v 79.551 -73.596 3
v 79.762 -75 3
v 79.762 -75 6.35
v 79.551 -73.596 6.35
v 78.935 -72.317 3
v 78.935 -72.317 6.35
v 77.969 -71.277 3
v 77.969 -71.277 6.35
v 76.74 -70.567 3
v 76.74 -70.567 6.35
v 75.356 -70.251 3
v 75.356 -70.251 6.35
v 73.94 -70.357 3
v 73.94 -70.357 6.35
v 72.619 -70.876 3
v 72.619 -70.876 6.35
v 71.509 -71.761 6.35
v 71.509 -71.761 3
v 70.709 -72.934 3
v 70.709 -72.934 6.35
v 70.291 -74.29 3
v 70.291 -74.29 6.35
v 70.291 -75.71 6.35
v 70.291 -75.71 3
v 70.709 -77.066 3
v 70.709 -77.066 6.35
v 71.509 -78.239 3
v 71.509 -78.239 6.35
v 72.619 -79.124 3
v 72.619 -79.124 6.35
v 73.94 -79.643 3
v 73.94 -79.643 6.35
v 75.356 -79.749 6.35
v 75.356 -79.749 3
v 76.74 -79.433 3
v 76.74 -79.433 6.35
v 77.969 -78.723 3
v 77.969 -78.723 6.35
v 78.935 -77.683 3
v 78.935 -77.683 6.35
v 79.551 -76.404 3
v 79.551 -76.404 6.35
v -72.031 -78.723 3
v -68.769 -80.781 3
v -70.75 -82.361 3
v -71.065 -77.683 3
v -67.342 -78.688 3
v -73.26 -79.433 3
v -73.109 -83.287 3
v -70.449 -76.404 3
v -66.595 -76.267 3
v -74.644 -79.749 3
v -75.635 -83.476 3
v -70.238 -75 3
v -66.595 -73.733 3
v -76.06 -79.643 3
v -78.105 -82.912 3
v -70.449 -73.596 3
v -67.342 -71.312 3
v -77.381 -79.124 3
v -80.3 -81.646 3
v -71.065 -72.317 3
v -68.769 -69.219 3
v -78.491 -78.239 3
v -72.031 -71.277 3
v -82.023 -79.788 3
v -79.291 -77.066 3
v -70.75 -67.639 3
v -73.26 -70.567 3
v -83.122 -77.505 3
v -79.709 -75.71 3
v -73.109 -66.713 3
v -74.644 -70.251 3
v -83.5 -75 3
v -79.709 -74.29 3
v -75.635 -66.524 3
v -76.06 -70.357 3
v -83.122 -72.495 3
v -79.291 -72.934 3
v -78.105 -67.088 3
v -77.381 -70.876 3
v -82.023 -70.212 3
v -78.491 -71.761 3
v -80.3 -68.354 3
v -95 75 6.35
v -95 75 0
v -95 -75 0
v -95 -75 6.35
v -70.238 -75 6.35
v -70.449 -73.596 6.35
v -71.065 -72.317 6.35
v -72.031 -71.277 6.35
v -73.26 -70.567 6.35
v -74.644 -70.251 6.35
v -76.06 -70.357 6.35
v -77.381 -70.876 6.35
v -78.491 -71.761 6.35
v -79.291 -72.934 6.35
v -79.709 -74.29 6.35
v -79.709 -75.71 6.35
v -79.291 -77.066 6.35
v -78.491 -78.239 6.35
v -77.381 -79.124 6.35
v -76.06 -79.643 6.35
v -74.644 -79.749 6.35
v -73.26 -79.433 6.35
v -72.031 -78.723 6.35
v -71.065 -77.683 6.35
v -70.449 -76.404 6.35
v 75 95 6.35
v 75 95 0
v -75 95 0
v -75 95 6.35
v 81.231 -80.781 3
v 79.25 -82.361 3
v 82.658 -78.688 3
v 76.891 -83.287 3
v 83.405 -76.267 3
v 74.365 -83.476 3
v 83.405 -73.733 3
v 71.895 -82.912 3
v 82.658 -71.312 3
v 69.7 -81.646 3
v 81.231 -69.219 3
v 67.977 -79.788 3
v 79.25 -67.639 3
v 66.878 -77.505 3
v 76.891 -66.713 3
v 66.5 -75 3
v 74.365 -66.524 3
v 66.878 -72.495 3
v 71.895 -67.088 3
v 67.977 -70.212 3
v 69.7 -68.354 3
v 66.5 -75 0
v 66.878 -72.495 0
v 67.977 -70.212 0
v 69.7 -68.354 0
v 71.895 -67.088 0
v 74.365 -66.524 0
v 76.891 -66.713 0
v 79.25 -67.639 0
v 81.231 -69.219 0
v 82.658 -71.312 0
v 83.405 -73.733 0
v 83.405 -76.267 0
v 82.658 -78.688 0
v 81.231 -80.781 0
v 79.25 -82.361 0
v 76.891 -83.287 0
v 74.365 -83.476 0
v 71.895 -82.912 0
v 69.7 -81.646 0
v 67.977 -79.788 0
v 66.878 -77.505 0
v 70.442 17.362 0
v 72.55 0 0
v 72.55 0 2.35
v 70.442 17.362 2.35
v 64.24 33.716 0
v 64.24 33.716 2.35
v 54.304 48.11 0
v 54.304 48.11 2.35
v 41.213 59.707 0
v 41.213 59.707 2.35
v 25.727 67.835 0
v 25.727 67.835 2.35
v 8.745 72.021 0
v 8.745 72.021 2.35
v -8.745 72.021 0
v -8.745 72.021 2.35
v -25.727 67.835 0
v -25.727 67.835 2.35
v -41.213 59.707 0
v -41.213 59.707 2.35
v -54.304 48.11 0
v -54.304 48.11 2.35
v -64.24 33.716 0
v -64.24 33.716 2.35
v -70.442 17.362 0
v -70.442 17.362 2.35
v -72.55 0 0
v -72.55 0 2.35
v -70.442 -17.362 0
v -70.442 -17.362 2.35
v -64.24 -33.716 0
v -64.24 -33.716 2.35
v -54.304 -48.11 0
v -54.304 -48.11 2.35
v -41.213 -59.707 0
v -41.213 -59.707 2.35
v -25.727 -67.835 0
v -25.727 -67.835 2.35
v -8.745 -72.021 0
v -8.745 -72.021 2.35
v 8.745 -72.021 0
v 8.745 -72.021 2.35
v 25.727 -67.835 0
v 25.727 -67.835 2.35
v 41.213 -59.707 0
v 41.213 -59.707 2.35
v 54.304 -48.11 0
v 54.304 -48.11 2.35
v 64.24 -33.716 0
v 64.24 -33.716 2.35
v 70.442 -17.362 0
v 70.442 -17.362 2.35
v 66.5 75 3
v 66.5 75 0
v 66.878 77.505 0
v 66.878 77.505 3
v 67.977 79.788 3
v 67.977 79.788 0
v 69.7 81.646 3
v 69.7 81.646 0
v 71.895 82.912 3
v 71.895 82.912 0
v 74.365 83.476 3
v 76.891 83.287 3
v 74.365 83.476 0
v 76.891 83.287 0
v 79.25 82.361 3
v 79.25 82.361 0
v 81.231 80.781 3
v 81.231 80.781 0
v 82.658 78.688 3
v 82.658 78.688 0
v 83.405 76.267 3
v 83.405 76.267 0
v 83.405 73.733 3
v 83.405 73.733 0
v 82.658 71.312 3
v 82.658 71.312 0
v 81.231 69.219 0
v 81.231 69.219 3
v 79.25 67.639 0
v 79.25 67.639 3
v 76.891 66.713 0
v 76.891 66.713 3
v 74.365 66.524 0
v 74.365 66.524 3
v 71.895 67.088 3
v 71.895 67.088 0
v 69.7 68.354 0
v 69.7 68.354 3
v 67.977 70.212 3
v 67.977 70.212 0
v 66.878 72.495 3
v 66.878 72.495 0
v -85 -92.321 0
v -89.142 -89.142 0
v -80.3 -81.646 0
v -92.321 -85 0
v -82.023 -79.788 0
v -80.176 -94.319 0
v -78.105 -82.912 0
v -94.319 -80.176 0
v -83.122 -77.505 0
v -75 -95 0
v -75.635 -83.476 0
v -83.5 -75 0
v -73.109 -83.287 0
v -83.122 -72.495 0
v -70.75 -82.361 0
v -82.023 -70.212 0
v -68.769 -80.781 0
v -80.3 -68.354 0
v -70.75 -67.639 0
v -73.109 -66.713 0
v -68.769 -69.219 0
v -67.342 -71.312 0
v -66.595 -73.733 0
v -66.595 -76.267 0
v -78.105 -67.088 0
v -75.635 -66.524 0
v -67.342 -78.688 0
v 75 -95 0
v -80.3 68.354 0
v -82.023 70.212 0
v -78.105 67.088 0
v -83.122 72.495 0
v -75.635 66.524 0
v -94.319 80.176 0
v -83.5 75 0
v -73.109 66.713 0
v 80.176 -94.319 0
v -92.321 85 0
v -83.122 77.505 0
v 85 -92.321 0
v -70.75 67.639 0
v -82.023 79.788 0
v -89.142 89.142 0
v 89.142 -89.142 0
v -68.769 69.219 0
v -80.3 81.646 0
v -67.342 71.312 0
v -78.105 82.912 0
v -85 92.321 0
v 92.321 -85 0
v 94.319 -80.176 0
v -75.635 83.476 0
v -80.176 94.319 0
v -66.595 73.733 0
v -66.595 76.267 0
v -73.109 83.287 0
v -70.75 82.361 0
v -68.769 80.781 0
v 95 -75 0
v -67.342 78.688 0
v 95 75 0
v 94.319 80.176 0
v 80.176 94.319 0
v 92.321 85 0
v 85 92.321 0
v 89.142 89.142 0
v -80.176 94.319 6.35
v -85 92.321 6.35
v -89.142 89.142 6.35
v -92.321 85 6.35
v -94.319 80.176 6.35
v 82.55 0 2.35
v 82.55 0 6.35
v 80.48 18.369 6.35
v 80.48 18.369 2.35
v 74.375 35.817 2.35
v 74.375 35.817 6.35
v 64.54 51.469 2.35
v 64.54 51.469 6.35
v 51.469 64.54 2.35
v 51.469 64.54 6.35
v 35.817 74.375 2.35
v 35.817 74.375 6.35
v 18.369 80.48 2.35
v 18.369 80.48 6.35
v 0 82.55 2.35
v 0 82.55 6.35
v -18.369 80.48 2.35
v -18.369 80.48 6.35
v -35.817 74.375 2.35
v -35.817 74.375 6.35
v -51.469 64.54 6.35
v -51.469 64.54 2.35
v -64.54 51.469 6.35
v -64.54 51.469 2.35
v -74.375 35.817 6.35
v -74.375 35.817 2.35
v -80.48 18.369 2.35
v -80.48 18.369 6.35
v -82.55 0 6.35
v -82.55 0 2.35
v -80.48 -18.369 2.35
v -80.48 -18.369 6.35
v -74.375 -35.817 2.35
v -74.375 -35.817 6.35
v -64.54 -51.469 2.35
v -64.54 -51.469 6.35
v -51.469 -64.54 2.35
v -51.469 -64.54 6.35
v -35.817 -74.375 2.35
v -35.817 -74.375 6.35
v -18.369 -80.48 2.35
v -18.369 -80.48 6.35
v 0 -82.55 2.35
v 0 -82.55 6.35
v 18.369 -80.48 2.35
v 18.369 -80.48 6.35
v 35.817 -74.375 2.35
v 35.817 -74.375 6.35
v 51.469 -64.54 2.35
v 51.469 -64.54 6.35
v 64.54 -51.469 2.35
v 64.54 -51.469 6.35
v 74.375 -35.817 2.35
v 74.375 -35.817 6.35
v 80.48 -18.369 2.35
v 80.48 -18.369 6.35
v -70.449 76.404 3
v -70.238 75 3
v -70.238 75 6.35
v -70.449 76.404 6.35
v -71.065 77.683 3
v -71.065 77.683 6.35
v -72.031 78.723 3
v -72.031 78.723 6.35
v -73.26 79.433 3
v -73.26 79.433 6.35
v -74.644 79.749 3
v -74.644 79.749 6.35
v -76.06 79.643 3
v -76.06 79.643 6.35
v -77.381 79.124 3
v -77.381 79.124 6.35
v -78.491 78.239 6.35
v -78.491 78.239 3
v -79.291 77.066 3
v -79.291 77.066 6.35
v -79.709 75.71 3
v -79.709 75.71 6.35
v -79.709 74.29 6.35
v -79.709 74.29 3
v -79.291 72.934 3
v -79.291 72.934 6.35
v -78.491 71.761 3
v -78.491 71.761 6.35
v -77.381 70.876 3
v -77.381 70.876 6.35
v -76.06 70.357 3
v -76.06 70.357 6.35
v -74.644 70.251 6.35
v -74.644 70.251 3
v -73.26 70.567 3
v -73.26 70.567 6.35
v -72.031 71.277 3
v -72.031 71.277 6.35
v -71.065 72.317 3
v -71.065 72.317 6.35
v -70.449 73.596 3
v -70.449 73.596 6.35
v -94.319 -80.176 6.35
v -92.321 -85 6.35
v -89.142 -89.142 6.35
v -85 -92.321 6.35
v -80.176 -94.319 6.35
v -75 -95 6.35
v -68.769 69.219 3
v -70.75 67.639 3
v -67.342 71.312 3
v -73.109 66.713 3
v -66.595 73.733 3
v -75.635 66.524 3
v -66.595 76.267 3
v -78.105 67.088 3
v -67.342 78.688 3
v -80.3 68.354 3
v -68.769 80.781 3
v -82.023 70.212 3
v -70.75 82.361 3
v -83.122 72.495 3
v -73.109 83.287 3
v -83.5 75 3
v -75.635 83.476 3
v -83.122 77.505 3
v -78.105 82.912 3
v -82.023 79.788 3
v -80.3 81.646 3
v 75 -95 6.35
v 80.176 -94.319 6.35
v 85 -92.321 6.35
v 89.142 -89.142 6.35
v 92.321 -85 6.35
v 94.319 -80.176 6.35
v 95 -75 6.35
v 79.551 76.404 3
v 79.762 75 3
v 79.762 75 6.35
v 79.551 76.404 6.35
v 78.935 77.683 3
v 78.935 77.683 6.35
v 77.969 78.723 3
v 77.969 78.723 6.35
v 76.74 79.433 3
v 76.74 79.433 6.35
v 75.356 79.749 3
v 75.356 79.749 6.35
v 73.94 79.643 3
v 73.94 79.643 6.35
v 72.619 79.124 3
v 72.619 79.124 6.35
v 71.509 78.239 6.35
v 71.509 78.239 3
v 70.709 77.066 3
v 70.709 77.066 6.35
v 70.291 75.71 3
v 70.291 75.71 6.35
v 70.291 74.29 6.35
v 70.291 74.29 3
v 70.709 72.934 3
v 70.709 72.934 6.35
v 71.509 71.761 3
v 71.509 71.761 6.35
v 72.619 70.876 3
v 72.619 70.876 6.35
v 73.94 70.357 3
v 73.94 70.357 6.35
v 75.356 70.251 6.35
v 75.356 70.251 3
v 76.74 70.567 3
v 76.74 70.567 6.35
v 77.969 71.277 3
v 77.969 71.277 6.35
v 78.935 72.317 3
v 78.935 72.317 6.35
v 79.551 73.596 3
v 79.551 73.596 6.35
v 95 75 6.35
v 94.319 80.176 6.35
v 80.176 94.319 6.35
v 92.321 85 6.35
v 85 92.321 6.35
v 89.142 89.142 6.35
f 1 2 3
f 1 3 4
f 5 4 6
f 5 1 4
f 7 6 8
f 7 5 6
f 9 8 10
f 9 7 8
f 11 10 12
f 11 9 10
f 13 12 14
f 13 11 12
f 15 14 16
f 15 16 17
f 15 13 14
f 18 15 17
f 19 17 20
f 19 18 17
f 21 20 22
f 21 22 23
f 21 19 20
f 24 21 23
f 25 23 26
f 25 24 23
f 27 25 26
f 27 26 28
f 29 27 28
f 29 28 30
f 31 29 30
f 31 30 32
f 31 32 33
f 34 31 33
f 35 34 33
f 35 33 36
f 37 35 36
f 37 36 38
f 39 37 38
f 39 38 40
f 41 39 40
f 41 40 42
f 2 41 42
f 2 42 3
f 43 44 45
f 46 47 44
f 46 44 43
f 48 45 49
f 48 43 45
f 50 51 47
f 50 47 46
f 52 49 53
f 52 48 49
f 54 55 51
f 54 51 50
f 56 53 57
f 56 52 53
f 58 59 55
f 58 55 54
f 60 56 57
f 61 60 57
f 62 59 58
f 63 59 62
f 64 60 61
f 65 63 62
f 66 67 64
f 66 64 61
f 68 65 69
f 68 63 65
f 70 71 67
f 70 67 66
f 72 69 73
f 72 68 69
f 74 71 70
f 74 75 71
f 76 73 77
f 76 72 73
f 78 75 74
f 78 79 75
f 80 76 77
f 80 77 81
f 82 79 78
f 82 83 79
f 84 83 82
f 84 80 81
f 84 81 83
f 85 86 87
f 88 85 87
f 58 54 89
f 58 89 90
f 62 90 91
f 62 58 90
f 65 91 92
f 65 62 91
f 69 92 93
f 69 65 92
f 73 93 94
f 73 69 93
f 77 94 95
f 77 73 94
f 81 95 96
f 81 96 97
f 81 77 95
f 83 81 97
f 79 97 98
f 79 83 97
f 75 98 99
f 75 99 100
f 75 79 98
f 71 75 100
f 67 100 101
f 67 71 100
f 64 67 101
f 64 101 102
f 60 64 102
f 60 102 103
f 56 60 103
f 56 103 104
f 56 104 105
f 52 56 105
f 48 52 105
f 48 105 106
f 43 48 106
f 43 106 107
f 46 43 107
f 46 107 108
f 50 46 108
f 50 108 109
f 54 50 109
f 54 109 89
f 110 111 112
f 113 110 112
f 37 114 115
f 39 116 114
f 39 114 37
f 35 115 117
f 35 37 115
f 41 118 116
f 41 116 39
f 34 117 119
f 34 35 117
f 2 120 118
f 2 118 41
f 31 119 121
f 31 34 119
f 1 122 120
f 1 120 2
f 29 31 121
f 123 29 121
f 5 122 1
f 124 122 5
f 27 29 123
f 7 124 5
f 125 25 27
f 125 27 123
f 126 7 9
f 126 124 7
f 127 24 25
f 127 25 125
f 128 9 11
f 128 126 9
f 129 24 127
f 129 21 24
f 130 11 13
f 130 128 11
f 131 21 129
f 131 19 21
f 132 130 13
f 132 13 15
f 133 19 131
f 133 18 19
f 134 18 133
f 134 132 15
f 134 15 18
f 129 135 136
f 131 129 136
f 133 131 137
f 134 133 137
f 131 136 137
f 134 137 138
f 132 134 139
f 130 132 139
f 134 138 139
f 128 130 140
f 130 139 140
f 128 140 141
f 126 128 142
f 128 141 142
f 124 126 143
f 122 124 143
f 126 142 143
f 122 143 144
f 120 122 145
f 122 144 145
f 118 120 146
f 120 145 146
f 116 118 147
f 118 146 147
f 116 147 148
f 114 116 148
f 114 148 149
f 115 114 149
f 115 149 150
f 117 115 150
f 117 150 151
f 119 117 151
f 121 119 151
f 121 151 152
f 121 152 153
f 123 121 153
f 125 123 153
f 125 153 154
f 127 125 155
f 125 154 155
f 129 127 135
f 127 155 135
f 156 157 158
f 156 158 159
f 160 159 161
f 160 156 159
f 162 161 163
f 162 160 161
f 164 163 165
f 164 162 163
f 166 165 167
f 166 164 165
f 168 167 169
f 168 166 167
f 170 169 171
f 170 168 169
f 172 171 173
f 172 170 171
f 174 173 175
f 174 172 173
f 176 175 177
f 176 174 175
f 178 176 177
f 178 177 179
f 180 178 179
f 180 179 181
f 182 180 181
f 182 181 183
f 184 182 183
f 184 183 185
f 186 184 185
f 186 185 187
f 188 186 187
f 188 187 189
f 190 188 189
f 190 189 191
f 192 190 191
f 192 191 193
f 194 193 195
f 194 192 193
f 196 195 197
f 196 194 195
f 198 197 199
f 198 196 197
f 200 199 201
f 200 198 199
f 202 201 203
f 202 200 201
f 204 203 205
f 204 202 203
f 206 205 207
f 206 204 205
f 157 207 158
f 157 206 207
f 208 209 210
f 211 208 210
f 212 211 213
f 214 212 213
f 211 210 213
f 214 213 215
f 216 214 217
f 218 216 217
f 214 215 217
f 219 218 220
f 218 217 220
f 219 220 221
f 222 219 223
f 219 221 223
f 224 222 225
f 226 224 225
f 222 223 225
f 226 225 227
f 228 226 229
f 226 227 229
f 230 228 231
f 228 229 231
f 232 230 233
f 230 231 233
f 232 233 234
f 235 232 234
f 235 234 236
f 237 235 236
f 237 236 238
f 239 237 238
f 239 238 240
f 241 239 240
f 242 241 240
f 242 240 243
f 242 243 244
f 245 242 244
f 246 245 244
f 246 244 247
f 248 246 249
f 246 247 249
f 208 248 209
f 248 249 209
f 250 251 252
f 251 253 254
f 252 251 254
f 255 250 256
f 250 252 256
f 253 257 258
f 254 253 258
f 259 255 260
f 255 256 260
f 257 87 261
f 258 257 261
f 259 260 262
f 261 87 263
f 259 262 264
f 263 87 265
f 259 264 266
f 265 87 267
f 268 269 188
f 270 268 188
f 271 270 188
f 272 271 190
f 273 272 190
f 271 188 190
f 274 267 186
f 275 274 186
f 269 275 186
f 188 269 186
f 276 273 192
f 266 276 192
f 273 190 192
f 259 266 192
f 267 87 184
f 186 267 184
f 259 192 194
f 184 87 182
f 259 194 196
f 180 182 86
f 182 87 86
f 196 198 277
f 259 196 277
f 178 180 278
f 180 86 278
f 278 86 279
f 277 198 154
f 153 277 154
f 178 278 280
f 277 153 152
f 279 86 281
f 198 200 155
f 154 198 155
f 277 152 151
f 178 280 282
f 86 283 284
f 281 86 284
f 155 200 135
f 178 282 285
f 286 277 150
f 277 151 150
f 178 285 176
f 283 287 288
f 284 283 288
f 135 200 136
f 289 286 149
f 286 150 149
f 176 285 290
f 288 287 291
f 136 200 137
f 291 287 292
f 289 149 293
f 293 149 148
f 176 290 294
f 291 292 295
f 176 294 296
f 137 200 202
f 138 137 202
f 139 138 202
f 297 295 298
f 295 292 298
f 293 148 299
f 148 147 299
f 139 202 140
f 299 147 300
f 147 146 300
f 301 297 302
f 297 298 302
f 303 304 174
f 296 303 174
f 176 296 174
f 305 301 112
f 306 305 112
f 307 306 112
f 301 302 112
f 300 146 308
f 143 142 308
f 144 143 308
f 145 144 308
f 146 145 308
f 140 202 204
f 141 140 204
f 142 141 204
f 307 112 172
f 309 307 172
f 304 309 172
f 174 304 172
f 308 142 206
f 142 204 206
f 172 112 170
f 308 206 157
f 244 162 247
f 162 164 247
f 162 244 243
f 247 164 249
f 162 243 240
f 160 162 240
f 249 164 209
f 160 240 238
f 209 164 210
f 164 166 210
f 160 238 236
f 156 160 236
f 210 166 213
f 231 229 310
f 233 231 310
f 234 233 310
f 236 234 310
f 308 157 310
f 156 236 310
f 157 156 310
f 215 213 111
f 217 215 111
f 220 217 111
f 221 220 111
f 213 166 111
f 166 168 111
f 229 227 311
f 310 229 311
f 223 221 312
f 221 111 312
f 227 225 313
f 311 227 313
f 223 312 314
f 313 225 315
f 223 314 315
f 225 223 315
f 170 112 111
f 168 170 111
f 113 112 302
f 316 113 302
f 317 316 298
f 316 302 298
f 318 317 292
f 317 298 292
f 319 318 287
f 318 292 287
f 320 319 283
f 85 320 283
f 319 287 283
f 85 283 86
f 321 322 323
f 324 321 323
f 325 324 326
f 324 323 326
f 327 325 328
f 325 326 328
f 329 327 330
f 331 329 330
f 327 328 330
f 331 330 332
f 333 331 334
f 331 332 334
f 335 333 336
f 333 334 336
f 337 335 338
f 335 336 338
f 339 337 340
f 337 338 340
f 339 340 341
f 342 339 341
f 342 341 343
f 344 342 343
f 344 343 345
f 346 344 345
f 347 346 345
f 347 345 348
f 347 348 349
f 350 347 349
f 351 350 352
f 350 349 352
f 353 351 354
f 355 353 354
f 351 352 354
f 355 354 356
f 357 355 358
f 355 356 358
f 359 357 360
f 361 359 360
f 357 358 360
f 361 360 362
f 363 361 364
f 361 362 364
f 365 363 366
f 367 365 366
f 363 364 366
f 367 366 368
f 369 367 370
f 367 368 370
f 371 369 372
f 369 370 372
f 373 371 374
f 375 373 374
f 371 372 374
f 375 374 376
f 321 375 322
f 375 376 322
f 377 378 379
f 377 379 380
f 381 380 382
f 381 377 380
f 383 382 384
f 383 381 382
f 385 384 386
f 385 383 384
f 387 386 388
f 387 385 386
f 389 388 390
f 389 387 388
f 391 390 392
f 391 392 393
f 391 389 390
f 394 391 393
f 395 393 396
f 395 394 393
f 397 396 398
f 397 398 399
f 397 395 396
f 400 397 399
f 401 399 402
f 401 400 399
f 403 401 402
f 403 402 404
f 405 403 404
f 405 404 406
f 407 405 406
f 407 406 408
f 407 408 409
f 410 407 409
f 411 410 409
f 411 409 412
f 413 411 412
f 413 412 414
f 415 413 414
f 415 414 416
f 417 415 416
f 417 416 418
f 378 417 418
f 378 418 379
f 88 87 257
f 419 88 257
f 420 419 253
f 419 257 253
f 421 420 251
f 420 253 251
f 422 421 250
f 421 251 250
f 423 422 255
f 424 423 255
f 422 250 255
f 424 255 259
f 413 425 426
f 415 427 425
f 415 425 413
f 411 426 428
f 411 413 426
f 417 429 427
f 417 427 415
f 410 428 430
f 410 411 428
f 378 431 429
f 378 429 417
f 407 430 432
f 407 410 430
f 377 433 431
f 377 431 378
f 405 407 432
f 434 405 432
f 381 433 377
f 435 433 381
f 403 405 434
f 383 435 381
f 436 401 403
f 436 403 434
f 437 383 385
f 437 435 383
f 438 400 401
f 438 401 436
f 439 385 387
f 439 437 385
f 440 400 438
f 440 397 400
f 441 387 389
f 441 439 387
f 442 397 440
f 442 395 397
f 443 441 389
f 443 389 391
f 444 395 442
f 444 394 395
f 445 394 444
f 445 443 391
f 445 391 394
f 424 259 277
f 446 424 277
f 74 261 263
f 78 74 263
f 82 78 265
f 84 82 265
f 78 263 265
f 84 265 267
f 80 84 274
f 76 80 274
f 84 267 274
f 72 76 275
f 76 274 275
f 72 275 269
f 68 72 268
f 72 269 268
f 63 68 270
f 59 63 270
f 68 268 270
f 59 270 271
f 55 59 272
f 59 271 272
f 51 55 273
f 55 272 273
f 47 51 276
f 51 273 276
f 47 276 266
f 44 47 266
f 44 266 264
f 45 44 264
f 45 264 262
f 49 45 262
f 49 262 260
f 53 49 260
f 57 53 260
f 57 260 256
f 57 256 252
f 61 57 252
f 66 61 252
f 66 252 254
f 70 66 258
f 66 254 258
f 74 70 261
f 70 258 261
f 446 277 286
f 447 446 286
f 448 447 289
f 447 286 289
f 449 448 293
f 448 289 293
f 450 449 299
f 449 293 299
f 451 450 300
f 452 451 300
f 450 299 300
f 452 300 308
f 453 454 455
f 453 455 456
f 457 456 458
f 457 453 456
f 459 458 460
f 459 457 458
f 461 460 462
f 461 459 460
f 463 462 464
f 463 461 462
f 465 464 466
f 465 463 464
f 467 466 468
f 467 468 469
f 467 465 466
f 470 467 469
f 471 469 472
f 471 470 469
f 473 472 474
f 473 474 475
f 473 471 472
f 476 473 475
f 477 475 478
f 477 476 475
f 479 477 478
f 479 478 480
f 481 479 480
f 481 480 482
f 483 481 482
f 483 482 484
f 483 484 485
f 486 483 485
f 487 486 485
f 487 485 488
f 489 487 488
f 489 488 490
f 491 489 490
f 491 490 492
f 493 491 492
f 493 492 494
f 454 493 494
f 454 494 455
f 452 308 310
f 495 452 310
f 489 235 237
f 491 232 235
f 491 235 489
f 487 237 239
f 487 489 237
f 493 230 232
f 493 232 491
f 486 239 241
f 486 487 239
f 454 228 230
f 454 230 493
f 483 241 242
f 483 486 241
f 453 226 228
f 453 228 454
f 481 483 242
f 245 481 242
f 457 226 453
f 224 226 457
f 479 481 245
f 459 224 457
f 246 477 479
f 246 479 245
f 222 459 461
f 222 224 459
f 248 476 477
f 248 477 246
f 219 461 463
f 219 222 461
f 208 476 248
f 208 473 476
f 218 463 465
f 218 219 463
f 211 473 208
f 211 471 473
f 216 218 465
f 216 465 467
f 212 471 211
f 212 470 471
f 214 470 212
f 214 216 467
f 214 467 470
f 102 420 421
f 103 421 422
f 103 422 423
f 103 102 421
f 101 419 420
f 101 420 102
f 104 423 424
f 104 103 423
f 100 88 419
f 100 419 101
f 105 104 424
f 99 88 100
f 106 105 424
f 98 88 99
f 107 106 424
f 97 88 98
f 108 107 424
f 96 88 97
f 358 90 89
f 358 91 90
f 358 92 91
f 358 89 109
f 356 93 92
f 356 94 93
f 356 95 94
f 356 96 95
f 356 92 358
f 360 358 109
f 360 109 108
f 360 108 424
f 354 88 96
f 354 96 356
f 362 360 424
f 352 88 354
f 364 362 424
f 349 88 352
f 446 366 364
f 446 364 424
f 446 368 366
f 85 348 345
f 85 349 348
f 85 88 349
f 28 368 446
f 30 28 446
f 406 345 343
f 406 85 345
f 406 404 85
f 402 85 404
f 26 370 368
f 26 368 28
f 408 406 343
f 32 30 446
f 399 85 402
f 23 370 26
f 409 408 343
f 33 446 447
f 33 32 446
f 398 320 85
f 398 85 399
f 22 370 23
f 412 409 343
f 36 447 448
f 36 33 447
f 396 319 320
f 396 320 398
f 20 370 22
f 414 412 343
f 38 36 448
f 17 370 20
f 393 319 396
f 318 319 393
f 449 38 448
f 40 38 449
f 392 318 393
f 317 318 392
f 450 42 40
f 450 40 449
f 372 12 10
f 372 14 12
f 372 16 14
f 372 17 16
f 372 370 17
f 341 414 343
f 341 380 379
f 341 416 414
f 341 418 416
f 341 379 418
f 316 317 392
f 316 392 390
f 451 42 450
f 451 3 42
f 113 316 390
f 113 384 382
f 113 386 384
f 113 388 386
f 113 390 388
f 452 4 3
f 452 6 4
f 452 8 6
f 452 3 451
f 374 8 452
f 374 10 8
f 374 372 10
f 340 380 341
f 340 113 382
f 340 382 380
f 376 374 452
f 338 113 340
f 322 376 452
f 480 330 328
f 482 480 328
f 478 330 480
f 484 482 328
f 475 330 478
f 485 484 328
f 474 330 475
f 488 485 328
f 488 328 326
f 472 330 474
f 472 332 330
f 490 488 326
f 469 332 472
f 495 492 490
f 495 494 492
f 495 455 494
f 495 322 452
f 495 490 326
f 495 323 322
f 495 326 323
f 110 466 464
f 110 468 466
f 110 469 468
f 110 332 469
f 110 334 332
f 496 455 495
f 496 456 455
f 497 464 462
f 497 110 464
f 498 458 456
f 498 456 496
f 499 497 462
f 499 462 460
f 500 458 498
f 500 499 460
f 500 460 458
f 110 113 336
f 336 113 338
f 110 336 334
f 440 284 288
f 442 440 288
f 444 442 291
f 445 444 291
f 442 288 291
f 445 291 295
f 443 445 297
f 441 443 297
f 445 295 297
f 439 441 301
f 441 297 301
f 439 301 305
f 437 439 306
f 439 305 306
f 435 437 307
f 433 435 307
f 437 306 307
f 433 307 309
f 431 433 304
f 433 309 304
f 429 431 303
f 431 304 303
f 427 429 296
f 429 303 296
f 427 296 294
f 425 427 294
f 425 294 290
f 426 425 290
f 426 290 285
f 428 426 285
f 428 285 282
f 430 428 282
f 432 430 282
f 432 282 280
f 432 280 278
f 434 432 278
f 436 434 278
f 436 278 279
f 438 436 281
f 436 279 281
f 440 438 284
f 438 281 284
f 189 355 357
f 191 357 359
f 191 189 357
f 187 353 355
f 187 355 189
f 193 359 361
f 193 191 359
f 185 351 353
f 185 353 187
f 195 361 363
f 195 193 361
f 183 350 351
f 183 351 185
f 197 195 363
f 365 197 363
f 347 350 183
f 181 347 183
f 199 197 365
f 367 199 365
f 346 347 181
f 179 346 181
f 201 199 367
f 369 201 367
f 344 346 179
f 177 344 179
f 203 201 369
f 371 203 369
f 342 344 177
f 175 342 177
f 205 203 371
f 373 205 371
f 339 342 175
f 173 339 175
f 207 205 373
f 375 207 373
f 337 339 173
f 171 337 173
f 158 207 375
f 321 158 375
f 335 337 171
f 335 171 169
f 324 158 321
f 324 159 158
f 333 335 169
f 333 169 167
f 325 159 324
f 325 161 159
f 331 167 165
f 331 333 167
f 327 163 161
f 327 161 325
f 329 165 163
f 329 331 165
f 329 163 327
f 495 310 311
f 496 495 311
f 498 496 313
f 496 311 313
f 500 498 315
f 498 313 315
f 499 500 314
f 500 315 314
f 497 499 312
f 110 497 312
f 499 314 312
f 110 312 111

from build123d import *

# Parameters (mm, degrees)
SKETCH1_R           = 72.55
SKETCH1_R_2         = 4.7625
BOSS_EXTRUDE1_DEPTH = 6.35
SKETCH2_R           = 82.55
CUT_EXTRUDE1_DEPTH  = 4
SKETCH3_R           = 8.5
CUT_EXTRUDE2_DEPTH  = 3


with BuildPart() as part:
    # Sketch1 → Boss-Extrude1 (new body)
    with BuildSketch(Plane.XY):
        with BuildLine():
            Line((-75, -95), (75, -95))
            ThreePointArc((75, -95), (89.142135624, -89.142135624), (95, -75))
            Line((95, -75), (95, 75))
            ThreePointArc((95, 75), (89.142135624, 89.142135624), (75, 95))
            Line((75, 95), (-75, 95))
            ThreePointArc((-75, 95), (-89.142135624, 89.142135624), (-95, 75))
            Line((-95, 75), (-95, -75))
            ThreePointArc((-95, -75), (-89.142135624, -89.142135624), (-75, -95))
        make_face()
        Circle(SKETCH1_R, mode=Mode.SUBTRACT)
        with Locations((-75, 75)):
            Circle(SKETCH1_R_2, mode=Mode.SUBTRACT)
        with Locations((75, 75)):
            Circle(SKETCH1_R_2, mode=Mode.SUBTRACT)
        with Locations((75, -75)):
            Circle(SKETCH1_R_2, mode=Mode.SUBTRACT)
        with Locations((-75, -75)):
            Circle(SKETCH1_R_2, mode=Mode.SUBTRACT)
    extrude(amount=BOSS_EXTRUDE1_DEPTH)

    # Sketch2 → Cut-Extrude1 (cut)
    with BuildSketch(Plane.XY.offset(6.35)):
        Circle(SKETCH2_R)
    extrude(amount=-CUT_EXTRUDE1_DEPTH, mode=Mode.SUBTRACT)

    # Sketch3 → Cut-Extrude2 (cut)
    with BuildSketch(Plane(origin=(0, 0, 0), x_dir=(-1, 0, 0), z_dir=(0, 0, -1))):
        with Locations((-75, 75)):
            Circle(SKETCH3_R)
        with Locations((75, 75)):
            Circle(SKETCH3_R)
        with Locations((75, -75)):
            Circle(SKETCH3_R)
        with Locations((-75, -75)):
            Circle(SKETCH3_R)
    extrude(amount=-CUT_EXTRUDE2_DEPTH, mode=Mode.SUBTRACT)


solid = part.part
